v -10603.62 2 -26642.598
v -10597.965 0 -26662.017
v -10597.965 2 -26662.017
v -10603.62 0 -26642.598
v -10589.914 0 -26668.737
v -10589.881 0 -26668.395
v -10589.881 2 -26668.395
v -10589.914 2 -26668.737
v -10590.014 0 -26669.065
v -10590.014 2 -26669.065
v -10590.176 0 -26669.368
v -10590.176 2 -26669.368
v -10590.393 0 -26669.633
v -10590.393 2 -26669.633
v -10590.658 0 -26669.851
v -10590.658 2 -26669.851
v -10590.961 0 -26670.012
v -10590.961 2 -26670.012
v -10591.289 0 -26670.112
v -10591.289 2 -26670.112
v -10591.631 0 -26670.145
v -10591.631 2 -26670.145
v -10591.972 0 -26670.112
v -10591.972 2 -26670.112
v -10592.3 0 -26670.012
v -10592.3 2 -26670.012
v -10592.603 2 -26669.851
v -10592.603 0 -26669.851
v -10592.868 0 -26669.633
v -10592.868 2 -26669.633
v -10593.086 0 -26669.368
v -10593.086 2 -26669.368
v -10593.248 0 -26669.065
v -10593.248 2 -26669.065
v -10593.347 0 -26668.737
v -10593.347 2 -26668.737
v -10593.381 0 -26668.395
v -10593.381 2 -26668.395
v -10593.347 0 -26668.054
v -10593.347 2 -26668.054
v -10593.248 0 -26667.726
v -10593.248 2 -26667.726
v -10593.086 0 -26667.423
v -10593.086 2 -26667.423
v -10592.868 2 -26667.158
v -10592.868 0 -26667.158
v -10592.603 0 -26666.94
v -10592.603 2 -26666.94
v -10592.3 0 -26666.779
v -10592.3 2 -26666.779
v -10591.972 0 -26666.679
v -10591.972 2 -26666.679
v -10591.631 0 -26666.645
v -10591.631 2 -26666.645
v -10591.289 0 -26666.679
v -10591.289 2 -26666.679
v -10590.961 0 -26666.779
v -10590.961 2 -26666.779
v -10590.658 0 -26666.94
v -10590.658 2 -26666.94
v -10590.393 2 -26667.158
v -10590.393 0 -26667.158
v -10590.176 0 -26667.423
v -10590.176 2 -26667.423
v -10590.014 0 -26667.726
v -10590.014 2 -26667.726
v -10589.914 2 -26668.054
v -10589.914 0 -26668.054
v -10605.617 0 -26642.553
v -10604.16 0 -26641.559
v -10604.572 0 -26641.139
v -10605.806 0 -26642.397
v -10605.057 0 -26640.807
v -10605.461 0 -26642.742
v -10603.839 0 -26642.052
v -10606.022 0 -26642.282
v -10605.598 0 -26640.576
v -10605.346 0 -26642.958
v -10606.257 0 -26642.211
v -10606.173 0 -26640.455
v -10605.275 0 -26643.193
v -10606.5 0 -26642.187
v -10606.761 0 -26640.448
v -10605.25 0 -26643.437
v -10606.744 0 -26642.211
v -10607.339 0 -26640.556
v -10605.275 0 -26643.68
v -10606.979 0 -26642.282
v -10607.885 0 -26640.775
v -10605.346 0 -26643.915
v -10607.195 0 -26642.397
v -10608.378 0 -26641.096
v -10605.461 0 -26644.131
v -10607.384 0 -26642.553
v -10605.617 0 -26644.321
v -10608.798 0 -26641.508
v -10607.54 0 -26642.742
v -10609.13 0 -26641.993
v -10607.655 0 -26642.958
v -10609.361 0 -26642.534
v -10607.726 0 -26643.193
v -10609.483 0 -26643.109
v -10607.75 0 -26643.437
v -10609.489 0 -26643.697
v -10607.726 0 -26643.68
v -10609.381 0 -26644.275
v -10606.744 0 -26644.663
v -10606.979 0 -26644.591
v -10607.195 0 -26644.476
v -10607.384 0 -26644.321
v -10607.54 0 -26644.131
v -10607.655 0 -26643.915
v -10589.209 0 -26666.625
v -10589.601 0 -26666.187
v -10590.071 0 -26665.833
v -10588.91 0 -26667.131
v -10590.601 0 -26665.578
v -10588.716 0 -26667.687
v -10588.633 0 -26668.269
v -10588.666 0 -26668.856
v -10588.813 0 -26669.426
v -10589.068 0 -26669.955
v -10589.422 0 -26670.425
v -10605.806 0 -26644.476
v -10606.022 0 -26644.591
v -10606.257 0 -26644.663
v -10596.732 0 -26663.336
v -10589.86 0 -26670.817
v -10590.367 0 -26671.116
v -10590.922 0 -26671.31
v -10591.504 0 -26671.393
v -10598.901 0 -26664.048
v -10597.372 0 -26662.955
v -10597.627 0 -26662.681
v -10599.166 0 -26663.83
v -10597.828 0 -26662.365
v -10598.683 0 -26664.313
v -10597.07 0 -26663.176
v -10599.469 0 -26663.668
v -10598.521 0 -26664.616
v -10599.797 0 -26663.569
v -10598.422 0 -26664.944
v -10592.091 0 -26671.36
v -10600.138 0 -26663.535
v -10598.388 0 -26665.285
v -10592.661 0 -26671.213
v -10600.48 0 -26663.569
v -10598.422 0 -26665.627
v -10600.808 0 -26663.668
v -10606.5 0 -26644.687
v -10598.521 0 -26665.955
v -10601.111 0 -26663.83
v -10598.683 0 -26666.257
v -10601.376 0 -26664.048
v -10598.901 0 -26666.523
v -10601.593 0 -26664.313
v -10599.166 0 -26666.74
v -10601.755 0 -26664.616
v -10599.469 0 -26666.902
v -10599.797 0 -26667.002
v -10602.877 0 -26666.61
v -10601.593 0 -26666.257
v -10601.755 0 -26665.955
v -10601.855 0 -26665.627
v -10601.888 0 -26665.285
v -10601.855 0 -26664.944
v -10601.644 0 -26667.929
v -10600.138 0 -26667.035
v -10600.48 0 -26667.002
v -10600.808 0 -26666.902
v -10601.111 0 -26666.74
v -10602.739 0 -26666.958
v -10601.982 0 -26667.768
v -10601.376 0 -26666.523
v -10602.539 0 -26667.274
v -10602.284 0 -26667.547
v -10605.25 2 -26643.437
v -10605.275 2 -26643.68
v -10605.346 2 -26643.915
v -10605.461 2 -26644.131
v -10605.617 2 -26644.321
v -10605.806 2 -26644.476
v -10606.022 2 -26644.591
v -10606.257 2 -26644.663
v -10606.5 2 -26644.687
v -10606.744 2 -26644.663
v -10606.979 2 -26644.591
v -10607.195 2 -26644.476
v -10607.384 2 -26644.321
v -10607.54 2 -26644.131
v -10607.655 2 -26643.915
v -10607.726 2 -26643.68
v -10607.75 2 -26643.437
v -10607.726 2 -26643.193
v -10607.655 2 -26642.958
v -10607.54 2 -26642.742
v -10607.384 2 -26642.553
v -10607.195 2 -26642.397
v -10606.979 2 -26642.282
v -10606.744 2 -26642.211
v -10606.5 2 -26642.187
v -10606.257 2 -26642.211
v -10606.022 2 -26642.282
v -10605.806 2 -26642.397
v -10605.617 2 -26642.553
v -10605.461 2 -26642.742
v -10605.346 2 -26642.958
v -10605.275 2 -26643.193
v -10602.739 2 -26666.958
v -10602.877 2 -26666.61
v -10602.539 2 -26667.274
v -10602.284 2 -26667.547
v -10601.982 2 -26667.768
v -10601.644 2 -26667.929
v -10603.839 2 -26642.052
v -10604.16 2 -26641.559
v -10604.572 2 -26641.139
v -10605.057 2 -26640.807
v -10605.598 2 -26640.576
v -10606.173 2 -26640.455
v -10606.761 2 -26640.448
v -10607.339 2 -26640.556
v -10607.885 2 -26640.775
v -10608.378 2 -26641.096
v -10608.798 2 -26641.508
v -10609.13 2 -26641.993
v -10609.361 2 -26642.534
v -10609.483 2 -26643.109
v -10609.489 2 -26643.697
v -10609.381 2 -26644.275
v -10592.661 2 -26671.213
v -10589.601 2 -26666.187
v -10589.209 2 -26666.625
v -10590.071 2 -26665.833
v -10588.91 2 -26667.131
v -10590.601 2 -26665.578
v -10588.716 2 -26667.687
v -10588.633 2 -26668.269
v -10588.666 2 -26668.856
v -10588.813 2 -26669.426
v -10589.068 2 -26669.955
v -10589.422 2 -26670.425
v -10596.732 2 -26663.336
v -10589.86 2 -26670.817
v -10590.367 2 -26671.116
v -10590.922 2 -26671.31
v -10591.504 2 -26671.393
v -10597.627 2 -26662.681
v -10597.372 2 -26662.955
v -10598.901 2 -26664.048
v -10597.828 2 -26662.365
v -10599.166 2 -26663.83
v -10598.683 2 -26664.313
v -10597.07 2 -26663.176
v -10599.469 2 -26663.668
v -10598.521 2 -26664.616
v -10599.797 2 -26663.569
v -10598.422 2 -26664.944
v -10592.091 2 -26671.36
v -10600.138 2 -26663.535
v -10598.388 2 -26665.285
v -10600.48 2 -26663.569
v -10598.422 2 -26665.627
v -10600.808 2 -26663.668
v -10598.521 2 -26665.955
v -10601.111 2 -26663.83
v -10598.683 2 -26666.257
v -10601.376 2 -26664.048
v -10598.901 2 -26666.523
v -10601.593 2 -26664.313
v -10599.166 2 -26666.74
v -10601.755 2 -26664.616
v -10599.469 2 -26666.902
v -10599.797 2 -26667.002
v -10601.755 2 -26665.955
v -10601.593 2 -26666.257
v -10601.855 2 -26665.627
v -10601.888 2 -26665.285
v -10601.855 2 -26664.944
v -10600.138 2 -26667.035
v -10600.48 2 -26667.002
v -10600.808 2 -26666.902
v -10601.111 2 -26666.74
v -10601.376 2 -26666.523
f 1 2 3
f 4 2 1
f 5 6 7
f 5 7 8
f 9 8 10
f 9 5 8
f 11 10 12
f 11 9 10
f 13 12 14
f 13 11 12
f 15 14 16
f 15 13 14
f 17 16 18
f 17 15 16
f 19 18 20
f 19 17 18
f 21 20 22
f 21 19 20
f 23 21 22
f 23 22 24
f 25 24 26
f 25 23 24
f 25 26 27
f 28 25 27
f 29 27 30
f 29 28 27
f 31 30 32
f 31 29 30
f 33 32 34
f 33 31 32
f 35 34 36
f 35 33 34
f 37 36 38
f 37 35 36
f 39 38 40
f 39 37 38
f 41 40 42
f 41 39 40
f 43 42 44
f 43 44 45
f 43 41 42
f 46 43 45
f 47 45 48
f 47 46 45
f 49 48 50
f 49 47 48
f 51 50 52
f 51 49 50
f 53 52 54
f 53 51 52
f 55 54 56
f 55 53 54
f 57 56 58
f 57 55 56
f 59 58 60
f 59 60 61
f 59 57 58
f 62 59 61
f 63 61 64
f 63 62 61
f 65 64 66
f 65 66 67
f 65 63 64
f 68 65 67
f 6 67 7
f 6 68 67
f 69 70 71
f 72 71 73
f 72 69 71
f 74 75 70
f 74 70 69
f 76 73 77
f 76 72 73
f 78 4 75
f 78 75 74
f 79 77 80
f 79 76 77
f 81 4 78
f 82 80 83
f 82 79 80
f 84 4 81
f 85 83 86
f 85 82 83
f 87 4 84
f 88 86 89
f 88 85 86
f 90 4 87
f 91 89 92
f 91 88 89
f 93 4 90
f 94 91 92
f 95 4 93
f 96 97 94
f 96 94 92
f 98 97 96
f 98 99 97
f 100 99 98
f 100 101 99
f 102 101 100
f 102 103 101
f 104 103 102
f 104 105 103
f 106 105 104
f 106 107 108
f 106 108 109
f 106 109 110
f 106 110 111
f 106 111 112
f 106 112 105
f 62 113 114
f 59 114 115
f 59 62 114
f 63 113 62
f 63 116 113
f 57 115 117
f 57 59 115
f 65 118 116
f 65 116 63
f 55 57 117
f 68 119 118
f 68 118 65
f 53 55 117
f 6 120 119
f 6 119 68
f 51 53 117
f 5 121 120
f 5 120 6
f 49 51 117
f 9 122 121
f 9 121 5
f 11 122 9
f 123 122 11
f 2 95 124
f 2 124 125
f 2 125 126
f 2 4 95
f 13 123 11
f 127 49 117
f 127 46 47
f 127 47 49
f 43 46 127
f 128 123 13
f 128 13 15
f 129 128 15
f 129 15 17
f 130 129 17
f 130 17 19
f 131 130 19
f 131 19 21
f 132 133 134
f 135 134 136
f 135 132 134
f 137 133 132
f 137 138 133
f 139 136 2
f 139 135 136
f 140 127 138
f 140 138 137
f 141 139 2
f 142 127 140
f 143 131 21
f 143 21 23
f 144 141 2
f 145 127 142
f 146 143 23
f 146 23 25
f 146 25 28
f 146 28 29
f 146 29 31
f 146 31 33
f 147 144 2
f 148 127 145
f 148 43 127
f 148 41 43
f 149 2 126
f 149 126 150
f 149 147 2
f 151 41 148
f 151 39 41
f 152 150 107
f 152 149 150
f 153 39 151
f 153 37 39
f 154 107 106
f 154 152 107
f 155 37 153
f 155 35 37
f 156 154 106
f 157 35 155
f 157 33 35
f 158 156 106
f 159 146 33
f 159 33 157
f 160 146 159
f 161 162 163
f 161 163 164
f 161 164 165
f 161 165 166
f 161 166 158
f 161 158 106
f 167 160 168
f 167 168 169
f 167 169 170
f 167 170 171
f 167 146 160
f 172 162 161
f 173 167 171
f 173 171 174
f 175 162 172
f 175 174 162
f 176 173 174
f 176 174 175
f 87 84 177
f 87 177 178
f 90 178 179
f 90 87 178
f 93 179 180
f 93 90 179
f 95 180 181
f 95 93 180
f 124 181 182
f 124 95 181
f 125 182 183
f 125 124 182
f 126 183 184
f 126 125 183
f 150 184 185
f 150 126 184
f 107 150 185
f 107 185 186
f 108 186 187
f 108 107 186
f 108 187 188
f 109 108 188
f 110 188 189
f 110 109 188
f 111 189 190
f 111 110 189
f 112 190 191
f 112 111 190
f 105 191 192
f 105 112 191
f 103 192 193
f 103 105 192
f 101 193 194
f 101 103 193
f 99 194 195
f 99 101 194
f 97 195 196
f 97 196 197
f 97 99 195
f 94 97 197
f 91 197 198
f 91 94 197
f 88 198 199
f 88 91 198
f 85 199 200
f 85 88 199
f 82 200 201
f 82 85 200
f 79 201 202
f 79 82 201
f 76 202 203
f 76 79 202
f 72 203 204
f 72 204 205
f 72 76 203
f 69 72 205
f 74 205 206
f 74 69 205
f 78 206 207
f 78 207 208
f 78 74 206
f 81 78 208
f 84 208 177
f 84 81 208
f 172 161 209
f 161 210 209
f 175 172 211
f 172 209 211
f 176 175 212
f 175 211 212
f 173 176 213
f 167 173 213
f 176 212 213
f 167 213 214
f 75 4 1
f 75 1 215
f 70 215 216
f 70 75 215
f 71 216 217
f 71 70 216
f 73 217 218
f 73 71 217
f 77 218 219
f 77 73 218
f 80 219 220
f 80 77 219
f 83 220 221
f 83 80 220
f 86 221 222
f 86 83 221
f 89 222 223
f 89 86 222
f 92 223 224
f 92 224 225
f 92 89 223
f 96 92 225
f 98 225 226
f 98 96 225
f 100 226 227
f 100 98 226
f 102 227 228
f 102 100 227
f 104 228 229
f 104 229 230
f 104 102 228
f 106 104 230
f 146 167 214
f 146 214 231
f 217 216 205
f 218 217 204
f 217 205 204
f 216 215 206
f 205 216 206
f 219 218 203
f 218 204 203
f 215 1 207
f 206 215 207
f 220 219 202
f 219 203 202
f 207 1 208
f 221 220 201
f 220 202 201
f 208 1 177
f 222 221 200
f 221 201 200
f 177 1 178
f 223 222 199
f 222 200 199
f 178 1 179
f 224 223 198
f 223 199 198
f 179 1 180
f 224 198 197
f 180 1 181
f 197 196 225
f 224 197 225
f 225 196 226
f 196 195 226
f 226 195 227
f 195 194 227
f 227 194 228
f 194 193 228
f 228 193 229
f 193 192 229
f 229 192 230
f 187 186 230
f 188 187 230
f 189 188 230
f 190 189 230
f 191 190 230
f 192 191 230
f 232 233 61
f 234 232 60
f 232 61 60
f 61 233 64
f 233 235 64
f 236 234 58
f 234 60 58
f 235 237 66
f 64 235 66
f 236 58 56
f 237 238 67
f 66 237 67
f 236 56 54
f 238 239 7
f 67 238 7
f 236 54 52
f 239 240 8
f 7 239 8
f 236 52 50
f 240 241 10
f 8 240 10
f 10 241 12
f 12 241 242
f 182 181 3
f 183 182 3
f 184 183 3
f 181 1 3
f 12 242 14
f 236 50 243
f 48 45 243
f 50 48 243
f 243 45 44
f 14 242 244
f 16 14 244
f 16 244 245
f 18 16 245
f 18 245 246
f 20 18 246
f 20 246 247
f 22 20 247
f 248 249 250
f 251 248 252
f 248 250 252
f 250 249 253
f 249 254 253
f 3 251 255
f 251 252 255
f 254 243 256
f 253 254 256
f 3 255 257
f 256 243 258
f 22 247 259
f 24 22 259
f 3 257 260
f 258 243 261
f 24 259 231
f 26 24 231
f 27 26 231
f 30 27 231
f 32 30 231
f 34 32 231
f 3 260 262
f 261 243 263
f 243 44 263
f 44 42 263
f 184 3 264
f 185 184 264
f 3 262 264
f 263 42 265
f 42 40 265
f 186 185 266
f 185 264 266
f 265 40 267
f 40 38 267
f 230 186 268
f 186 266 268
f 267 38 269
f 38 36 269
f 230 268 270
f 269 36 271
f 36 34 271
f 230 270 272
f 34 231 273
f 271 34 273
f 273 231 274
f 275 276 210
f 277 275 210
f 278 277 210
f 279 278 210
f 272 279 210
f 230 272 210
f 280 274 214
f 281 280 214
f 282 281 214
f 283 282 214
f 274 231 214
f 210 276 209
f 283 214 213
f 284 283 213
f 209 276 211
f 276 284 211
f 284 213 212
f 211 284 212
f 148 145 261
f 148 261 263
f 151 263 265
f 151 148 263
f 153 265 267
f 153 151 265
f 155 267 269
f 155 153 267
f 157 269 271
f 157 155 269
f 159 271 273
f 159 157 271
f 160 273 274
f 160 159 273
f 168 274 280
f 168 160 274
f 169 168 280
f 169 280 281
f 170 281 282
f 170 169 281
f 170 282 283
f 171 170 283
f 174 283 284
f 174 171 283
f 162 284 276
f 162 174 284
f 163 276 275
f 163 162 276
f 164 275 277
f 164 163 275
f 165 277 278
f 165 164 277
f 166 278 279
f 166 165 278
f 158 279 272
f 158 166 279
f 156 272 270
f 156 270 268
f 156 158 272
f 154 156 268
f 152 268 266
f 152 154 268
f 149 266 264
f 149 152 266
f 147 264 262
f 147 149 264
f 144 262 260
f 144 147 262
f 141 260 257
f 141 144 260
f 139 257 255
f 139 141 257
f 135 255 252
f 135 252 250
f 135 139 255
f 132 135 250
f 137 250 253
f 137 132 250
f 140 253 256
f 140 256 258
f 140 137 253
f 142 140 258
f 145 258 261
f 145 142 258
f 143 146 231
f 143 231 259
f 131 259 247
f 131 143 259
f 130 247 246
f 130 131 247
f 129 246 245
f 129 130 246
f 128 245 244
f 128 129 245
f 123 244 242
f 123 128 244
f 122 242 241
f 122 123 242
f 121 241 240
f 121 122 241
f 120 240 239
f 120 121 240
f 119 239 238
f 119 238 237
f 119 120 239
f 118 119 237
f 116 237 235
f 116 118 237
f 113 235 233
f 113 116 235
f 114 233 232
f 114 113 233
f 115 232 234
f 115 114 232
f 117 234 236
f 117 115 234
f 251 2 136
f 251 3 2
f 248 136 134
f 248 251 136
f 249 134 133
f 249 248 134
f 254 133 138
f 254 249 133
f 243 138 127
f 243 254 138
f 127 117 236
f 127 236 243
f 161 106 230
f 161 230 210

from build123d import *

# Parameters (mm, degrees)
SKETCH1_R           = 1.75
SKETCH1_R_2         = 1.25
BOSS_EXTRUDE1_DEPTH = 2
FILLET1_R           = 2


with BuildPart() as part:
    # Sketch1 → Boss-Extrude1 (new body)
    with BuildSketch(Plane(origin=(0, 0, 0), x_dir=(1, 0, 0), z_dir=(0, 1, 0))):
        with BuildLine():
            Line((-10609.380855774, 26644.275372767), (-10602.594176906, 26667.581570052))
            Line((-10602.594176906, 26667.581570052), (-10592.660823342, 26671.213057009))
            ThreePointArc((-10592.660823342, 26671.213057009), (-10588.813133366, 26669.425521878), (-10590.600668497, 26665.577831901))
            Line((-10590.600668497, 26665.577831901), (-10597.682341811, 26662.988877013))
            Line((-10597.682341811, 26662.988877013), (-10603.62012799, 26642.597870039))
            ThreePointArc((-10603.62012799, 26642.597870039), (-10607.339243246, 26640.556257511), (-10609.380855774, 26644.275372767))
        make_face()
        with Locations((-10591.63074592, 26668.395444455)):
            Circle(SKETCH1_R, mode=Mode.SUBTRACT)
        with Locations((-10600.138259358, 26665.285223533)):
            Circle(SKETCH1_R, mode=Mode.SUBTRACT)
        with Locations((-10606.500491882, 26643.436621403)):
            Circle(SKETCH1_R_2, mode=Mode.SUBTRACT)
    extrude(amount=BOSS_EXTRUDE1_DEPTH)

    # Fillet1
    fillet1_edges = [part.edges().sort_by_distance(p)[0] for p in [
        (-10597.682341811, 1, -26662.988877013),
        (-10602.594176906, 1, -26667.581570052),
    ]]
    fillet(fillet1_edges, radius=FILLET1_R)


solid = part.part
